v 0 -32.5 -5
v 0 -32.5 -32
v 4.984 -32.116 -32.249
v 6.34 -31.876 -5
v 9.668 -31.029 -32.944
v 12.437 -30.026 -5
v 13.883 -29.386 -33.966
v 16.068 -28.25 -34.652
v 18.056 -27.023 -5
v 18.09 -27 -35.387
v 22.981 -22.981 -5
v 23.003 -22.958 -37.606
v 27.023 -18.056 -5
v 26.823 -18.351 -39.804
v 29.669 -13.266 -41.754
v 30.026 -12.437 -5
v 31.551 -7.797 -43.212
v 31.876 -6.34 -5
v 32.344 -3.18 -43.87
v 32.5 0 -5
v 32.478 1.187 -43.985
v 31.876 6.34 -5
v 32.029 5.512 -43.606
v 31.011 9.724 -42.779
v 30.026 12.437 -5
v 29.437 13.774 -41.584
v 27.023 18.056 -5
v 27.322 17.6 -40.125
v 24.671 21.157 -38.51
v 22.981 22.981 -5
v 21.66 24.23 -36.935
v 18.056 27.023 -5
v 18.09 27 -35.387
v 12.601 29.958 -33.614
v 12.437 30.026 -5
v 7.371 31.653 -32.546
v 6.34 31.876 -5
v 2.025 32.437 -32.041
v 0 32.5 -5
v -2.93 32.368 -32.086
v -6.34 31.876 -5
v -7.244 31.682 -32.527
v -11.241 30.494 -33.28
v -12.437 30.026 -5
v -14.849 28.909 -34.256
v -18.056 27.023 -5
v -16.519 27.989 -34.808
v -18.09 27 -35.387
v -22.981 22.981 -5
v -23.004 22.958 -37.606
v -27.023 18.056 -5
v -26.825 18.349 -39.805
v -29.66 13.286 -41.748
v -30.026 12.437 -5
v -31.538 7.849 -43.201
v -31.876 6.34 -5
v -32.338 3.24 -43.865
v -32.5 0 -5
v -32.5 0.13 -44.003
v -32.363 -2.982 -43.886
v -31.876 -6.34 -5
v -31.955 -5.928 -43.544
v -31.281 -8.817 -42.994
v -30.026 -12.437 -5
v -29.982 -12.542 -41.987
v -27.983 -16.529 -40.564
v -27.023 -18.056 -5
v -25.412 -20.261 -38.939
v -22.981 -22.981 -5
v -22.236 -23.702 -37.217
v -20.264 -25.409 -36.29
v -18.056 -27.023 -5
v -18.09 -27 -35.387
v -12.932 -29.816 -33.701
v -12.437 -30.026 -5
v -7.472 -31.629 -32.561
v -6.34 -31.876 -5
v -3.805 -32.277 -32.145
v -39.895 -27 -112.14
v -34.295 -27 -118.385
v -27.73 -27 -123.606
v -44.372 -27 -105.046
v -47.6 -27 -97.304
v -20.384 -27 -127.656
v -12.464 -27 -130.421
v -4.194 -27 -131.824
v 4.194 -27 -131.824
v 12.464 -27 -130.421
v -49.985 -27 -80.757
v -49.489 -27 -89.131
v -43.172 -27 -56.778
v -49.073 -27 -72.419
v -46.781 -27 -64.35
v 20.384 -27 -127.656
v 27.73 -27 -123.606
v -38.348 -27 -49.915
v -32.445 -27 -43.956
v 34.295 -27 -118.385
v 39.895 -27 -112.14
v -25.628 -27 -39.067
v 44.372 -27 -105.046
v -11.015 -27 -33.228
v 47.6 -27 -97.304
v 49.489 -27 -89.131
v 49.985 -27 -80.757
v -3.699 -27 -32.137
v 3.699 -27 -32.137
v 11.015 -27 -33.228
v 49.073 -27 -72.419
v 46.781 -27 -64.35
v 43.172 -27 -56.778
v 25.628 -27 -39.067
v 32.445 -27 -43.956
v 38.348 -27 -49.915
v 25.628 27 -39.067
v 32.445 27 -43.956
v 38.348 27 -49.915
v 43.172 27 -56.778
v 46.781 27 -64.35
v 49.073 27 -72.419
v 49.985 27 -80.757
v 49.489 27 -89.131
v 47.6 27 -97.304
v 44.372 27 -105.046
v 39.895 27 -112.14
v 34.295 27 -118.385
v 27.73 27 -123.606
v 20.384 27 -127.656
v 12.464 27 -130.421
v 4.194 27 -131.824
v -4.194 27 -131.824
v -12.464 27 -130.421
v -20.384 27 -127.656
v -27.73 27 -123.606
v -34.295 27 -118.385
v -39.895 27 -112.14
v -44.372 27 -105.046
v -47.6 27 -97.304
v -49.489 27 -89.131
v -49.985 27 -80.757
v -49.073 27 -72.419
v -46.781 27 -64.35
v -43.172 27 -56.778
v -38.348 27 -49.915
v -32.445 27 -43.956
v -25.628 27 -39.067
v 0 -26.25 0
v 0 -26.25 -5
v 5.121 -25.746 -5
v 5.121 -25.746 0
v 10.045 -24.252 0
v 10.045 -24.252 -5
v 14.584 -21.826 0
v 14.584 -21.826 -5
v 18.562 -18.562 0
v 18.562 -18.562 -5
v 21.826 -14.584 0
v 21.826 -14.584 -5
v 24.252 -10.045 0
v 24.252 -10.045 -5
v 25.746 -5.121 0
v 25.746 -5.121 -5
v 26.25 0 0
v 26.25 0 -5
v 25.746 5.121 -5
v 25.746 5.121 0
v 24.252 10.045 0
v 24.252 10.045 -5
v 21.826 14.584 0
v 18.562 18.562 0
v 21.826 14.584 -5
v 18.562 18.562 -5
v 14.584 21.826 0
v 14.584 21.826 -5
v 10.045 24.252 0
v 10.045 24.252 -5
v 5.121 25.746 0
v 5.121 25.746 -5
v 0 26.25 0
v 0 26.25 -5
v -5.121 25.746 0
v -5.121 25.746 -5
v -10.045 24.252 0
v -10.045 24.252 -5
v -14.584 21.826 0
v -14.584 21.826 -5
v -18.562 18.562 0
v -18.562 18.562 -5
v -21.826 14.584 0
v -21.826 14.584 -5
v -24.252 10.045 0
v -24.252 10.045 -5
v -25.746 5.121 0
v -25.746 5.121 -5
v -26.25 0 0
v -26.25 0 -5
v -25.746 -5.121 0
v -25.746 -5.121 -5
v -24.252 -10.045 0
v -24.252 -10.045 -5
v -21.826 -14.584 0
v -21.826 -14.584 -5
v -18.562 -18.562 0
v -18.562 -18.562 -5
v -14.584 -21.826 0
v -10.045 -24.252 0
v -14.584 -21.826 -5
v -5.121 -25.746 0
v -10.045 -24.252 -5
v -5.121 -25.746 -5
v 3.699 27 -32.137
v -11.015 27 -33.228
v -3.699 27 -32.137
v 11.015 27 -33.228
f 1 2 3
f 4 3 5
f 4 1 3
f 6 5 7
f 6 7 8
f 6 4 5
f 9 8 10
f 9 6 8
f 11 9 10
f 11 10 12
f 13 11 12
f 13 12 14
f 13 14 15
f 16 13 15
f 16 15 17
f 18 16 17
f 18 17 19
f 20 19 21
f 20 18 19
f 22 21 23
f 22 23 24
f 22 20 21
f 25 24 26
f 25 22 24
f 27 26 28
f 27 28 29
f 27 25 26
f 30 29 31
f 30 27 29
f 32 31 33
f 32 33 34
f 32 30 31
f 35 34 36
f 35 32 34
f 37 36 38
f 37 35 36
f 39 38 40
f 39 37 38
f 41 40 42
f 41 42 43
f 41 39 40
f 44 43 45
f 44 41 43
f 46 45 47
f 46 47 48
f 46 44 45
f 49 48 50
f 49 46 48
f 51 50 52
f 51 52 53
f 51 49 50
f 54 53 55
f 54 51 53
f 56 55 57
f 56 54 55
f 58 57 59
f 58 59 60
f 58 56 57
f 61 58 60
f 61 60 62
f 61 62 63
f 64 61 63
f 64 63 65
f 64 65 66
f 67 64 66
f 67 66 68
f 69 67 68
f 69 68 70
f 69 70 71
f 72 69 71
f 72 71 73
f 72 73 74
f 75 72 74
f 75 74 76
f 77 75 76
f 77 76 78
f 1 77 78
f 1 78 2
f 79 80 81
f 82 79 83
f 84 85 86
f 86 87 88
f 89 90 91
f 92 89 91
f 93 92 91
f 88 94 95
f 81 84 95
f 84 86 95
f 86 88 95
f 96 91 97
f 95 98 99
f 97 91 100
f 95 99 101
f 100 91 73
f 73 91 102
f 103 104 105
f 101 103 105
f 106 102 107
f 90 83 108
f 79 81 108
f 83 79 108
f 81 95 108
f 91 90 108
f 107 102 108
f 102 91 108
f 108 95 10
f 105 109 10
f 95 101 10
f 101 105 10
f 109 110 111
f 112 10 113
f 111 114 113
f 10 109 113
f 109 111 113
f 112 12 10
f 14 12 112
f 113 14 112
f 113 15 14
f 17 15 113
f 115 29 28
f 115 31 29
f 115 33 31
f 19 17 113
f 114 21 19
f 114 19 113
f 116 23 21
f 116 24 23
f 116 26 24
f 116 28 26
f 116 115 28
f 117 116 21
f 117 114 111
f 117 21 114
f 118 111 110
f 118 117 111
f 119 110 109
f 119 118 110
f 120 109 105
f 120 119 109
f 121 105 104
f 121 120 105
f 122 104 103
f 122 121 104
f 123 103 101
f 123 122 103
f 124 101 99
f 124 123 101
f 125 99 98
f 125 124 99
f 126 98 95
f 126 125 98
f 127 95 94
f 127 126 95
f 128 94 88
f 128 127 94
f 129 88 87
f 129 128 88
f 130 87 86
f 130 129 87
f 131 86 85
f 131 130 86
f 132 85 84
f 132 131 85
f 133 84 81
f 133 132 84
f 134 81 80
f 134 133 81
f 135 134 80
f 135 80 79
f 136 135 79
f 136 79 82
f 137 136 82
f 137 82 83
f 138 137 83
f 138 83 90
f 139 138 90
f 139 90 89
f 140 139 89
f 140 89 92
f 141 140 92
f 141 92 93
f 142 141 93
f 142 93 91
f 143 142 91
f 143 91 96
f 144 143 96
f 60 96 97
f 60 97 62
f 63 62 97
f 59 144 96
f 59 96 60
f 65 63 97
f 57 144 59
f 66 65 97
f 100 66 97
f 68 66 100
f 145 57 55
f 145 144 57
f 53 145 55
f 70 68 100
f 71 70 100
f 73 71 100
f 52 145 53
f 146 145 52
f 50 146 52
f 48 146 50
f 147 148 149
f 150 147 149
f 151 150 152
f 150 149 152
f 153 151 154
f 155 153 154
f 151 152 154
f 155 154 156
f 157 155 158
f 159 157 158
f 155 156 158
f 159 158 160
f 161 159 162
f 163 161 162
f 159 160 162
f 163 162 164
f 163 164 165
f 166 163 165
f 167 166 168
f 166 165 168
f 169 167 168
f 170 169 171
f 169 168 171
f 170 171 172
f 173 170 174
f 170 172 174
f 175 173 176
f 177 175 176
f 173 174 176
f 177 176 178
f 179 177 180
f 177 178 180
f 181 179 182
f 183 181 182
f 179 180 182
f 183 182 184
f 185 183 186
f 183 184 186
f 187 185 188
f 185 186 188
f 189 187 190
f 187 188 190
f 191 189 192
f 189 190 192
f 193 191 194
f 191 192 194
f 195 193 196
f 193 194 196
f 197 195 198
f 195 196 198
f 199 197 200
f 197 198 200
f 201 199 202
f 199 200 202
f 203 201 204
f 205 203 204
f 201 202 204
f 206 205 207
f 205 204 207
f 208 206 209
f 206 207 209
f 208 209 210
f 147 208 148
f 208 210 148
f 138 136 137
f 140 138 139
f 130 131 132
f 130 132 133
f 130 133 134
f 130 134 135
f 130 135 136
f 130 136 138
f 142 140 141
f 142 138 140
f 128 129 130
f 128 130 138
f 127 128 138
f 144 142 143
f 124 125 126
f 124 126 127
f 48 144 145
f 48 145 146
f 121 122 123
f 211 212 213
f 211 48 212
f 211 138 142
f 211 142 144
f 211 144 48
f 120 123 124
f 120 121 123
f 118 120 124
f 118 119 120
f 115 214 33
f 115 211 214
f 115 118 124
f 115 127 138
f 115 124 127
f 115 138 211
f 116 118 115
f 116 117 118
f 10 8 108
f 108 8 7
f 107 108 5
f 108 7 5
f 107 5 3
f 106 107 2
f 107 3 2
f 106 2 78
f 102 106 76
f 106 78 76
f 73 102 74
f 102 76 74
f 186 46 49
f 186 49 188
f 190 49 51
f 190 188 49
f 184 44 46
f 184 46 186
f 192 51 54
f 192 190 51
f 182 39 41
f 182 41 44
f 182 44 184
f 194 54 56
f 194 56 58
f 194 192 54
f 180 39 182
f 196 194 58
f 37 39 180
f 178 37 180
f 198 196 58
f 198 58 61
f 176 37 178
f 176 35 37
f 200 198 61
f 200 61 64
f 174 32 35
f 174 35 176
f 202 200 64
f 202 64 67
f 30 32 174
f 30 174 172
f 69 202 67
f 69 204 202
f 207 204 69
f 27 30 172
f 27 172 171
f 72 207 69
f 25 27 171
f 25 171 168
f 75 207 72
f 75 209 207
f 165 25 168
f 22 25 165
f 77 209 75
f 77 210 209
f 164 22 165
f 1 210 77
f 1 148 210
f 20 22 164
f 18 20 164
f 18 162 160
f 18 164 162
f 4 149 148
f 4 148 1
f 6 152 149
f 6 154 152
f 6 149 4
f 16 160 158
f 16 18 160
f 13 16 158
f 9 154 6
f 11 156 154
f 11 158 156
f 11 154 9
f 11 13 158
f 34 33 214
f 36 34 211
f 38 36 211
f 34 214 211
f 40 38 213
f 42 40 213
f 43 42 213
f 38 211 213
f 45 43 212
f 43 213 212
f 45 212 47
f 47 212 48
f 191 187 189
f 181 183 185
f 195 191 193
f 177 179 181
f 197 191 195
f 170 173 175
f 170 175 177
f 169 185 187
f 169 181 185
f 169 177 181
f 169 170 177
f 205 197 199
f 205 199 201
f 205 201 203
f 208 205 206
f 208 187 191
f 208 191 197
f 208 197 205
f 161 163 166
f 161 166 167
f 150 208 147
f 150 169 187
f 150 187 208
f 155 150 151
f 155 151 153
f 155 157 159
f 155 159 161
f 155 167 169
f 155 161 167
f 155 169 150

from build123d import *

# Parameters (mm, degrees)
SKETCH1_R                = 50
BOSS_EXTRUDE1_DEPTH      = 27
BOSS_EXTRUDE2_REACH      = 141.133
BOSS_EXTRUDE2_END_RADIUS = 50
SKETCH2_R                = 32.5
SKETCH3_R                = 26.25
BOSS_EXTRUDE3_DEPTH      = 5
BODY_MOVE_COPY2_ANGLE    = 120


with BuildPart() as part:
    # Sketch1 → Boss-Extrude1 (new, symmetric)
    with BuildSketch(Plane.XY):
        Circle(SKETCH1_R)
    extrude(amount=BOSS_EXTRUDE1_DEPTH, both=True)

    # Boss-Extrude2: up to this cylinder (the profile starts outside it)
    boss_extrude2_end = Plane(origin=(0, 0, 0), z_dir=(0, 0, -1)) * Cylinder(BOSS_EXTRUDE2_END_RADIUS, 383.266, mode=Mode.PRIVATE)
    # Sketch2 → Boss-Extrude2 (add, up to the surface)
    with BuildSketch(Plane(origin=(77, 0, 0), x_dir=(0, 0, -1), z_dir=(1, 0, 0)), mode=Mode.PRIVATE) as boss_extrude2_sk1:
        Circle(SKETCH2_R)
    boss_extrude2_tool1 = extrude(boss_extrude2_sk1.sketch, amount=-BOSS_EXTRUDE2_REACH, mode=Mode.PRIVATE) - boss_extrude2_end
    add(boss_extrude2_tool1.solids().sort_by_distance((77, 0, 0))[0])

    # Sketch3 → Boss-Extrude3 (add)
    with BuildSketch(Plane(origin=(77, 0, 0), x_dir=(0, 0, -1), z_dir=(1, 0, 0))):
        Circle(SKETCH3_R)
    extrude(amount=BOSS_EXTRUDE3_DEPTH)


with BuildPart() as part_1:
    # Body-Move/Copy1: moved
    add(part.part.moved(Location((-82, 0, 0))))


with BuildPart() as part_2:
    # Body-Move/Copy2: moved
    add(part_1.part.rotate(Axis((0, 0, 0), (-0.5773502691896272, -0.5773502691896252, -0.5773502691896252)), BODY_MOVE_COPY2_ANGLE))


solid = part_2.part
